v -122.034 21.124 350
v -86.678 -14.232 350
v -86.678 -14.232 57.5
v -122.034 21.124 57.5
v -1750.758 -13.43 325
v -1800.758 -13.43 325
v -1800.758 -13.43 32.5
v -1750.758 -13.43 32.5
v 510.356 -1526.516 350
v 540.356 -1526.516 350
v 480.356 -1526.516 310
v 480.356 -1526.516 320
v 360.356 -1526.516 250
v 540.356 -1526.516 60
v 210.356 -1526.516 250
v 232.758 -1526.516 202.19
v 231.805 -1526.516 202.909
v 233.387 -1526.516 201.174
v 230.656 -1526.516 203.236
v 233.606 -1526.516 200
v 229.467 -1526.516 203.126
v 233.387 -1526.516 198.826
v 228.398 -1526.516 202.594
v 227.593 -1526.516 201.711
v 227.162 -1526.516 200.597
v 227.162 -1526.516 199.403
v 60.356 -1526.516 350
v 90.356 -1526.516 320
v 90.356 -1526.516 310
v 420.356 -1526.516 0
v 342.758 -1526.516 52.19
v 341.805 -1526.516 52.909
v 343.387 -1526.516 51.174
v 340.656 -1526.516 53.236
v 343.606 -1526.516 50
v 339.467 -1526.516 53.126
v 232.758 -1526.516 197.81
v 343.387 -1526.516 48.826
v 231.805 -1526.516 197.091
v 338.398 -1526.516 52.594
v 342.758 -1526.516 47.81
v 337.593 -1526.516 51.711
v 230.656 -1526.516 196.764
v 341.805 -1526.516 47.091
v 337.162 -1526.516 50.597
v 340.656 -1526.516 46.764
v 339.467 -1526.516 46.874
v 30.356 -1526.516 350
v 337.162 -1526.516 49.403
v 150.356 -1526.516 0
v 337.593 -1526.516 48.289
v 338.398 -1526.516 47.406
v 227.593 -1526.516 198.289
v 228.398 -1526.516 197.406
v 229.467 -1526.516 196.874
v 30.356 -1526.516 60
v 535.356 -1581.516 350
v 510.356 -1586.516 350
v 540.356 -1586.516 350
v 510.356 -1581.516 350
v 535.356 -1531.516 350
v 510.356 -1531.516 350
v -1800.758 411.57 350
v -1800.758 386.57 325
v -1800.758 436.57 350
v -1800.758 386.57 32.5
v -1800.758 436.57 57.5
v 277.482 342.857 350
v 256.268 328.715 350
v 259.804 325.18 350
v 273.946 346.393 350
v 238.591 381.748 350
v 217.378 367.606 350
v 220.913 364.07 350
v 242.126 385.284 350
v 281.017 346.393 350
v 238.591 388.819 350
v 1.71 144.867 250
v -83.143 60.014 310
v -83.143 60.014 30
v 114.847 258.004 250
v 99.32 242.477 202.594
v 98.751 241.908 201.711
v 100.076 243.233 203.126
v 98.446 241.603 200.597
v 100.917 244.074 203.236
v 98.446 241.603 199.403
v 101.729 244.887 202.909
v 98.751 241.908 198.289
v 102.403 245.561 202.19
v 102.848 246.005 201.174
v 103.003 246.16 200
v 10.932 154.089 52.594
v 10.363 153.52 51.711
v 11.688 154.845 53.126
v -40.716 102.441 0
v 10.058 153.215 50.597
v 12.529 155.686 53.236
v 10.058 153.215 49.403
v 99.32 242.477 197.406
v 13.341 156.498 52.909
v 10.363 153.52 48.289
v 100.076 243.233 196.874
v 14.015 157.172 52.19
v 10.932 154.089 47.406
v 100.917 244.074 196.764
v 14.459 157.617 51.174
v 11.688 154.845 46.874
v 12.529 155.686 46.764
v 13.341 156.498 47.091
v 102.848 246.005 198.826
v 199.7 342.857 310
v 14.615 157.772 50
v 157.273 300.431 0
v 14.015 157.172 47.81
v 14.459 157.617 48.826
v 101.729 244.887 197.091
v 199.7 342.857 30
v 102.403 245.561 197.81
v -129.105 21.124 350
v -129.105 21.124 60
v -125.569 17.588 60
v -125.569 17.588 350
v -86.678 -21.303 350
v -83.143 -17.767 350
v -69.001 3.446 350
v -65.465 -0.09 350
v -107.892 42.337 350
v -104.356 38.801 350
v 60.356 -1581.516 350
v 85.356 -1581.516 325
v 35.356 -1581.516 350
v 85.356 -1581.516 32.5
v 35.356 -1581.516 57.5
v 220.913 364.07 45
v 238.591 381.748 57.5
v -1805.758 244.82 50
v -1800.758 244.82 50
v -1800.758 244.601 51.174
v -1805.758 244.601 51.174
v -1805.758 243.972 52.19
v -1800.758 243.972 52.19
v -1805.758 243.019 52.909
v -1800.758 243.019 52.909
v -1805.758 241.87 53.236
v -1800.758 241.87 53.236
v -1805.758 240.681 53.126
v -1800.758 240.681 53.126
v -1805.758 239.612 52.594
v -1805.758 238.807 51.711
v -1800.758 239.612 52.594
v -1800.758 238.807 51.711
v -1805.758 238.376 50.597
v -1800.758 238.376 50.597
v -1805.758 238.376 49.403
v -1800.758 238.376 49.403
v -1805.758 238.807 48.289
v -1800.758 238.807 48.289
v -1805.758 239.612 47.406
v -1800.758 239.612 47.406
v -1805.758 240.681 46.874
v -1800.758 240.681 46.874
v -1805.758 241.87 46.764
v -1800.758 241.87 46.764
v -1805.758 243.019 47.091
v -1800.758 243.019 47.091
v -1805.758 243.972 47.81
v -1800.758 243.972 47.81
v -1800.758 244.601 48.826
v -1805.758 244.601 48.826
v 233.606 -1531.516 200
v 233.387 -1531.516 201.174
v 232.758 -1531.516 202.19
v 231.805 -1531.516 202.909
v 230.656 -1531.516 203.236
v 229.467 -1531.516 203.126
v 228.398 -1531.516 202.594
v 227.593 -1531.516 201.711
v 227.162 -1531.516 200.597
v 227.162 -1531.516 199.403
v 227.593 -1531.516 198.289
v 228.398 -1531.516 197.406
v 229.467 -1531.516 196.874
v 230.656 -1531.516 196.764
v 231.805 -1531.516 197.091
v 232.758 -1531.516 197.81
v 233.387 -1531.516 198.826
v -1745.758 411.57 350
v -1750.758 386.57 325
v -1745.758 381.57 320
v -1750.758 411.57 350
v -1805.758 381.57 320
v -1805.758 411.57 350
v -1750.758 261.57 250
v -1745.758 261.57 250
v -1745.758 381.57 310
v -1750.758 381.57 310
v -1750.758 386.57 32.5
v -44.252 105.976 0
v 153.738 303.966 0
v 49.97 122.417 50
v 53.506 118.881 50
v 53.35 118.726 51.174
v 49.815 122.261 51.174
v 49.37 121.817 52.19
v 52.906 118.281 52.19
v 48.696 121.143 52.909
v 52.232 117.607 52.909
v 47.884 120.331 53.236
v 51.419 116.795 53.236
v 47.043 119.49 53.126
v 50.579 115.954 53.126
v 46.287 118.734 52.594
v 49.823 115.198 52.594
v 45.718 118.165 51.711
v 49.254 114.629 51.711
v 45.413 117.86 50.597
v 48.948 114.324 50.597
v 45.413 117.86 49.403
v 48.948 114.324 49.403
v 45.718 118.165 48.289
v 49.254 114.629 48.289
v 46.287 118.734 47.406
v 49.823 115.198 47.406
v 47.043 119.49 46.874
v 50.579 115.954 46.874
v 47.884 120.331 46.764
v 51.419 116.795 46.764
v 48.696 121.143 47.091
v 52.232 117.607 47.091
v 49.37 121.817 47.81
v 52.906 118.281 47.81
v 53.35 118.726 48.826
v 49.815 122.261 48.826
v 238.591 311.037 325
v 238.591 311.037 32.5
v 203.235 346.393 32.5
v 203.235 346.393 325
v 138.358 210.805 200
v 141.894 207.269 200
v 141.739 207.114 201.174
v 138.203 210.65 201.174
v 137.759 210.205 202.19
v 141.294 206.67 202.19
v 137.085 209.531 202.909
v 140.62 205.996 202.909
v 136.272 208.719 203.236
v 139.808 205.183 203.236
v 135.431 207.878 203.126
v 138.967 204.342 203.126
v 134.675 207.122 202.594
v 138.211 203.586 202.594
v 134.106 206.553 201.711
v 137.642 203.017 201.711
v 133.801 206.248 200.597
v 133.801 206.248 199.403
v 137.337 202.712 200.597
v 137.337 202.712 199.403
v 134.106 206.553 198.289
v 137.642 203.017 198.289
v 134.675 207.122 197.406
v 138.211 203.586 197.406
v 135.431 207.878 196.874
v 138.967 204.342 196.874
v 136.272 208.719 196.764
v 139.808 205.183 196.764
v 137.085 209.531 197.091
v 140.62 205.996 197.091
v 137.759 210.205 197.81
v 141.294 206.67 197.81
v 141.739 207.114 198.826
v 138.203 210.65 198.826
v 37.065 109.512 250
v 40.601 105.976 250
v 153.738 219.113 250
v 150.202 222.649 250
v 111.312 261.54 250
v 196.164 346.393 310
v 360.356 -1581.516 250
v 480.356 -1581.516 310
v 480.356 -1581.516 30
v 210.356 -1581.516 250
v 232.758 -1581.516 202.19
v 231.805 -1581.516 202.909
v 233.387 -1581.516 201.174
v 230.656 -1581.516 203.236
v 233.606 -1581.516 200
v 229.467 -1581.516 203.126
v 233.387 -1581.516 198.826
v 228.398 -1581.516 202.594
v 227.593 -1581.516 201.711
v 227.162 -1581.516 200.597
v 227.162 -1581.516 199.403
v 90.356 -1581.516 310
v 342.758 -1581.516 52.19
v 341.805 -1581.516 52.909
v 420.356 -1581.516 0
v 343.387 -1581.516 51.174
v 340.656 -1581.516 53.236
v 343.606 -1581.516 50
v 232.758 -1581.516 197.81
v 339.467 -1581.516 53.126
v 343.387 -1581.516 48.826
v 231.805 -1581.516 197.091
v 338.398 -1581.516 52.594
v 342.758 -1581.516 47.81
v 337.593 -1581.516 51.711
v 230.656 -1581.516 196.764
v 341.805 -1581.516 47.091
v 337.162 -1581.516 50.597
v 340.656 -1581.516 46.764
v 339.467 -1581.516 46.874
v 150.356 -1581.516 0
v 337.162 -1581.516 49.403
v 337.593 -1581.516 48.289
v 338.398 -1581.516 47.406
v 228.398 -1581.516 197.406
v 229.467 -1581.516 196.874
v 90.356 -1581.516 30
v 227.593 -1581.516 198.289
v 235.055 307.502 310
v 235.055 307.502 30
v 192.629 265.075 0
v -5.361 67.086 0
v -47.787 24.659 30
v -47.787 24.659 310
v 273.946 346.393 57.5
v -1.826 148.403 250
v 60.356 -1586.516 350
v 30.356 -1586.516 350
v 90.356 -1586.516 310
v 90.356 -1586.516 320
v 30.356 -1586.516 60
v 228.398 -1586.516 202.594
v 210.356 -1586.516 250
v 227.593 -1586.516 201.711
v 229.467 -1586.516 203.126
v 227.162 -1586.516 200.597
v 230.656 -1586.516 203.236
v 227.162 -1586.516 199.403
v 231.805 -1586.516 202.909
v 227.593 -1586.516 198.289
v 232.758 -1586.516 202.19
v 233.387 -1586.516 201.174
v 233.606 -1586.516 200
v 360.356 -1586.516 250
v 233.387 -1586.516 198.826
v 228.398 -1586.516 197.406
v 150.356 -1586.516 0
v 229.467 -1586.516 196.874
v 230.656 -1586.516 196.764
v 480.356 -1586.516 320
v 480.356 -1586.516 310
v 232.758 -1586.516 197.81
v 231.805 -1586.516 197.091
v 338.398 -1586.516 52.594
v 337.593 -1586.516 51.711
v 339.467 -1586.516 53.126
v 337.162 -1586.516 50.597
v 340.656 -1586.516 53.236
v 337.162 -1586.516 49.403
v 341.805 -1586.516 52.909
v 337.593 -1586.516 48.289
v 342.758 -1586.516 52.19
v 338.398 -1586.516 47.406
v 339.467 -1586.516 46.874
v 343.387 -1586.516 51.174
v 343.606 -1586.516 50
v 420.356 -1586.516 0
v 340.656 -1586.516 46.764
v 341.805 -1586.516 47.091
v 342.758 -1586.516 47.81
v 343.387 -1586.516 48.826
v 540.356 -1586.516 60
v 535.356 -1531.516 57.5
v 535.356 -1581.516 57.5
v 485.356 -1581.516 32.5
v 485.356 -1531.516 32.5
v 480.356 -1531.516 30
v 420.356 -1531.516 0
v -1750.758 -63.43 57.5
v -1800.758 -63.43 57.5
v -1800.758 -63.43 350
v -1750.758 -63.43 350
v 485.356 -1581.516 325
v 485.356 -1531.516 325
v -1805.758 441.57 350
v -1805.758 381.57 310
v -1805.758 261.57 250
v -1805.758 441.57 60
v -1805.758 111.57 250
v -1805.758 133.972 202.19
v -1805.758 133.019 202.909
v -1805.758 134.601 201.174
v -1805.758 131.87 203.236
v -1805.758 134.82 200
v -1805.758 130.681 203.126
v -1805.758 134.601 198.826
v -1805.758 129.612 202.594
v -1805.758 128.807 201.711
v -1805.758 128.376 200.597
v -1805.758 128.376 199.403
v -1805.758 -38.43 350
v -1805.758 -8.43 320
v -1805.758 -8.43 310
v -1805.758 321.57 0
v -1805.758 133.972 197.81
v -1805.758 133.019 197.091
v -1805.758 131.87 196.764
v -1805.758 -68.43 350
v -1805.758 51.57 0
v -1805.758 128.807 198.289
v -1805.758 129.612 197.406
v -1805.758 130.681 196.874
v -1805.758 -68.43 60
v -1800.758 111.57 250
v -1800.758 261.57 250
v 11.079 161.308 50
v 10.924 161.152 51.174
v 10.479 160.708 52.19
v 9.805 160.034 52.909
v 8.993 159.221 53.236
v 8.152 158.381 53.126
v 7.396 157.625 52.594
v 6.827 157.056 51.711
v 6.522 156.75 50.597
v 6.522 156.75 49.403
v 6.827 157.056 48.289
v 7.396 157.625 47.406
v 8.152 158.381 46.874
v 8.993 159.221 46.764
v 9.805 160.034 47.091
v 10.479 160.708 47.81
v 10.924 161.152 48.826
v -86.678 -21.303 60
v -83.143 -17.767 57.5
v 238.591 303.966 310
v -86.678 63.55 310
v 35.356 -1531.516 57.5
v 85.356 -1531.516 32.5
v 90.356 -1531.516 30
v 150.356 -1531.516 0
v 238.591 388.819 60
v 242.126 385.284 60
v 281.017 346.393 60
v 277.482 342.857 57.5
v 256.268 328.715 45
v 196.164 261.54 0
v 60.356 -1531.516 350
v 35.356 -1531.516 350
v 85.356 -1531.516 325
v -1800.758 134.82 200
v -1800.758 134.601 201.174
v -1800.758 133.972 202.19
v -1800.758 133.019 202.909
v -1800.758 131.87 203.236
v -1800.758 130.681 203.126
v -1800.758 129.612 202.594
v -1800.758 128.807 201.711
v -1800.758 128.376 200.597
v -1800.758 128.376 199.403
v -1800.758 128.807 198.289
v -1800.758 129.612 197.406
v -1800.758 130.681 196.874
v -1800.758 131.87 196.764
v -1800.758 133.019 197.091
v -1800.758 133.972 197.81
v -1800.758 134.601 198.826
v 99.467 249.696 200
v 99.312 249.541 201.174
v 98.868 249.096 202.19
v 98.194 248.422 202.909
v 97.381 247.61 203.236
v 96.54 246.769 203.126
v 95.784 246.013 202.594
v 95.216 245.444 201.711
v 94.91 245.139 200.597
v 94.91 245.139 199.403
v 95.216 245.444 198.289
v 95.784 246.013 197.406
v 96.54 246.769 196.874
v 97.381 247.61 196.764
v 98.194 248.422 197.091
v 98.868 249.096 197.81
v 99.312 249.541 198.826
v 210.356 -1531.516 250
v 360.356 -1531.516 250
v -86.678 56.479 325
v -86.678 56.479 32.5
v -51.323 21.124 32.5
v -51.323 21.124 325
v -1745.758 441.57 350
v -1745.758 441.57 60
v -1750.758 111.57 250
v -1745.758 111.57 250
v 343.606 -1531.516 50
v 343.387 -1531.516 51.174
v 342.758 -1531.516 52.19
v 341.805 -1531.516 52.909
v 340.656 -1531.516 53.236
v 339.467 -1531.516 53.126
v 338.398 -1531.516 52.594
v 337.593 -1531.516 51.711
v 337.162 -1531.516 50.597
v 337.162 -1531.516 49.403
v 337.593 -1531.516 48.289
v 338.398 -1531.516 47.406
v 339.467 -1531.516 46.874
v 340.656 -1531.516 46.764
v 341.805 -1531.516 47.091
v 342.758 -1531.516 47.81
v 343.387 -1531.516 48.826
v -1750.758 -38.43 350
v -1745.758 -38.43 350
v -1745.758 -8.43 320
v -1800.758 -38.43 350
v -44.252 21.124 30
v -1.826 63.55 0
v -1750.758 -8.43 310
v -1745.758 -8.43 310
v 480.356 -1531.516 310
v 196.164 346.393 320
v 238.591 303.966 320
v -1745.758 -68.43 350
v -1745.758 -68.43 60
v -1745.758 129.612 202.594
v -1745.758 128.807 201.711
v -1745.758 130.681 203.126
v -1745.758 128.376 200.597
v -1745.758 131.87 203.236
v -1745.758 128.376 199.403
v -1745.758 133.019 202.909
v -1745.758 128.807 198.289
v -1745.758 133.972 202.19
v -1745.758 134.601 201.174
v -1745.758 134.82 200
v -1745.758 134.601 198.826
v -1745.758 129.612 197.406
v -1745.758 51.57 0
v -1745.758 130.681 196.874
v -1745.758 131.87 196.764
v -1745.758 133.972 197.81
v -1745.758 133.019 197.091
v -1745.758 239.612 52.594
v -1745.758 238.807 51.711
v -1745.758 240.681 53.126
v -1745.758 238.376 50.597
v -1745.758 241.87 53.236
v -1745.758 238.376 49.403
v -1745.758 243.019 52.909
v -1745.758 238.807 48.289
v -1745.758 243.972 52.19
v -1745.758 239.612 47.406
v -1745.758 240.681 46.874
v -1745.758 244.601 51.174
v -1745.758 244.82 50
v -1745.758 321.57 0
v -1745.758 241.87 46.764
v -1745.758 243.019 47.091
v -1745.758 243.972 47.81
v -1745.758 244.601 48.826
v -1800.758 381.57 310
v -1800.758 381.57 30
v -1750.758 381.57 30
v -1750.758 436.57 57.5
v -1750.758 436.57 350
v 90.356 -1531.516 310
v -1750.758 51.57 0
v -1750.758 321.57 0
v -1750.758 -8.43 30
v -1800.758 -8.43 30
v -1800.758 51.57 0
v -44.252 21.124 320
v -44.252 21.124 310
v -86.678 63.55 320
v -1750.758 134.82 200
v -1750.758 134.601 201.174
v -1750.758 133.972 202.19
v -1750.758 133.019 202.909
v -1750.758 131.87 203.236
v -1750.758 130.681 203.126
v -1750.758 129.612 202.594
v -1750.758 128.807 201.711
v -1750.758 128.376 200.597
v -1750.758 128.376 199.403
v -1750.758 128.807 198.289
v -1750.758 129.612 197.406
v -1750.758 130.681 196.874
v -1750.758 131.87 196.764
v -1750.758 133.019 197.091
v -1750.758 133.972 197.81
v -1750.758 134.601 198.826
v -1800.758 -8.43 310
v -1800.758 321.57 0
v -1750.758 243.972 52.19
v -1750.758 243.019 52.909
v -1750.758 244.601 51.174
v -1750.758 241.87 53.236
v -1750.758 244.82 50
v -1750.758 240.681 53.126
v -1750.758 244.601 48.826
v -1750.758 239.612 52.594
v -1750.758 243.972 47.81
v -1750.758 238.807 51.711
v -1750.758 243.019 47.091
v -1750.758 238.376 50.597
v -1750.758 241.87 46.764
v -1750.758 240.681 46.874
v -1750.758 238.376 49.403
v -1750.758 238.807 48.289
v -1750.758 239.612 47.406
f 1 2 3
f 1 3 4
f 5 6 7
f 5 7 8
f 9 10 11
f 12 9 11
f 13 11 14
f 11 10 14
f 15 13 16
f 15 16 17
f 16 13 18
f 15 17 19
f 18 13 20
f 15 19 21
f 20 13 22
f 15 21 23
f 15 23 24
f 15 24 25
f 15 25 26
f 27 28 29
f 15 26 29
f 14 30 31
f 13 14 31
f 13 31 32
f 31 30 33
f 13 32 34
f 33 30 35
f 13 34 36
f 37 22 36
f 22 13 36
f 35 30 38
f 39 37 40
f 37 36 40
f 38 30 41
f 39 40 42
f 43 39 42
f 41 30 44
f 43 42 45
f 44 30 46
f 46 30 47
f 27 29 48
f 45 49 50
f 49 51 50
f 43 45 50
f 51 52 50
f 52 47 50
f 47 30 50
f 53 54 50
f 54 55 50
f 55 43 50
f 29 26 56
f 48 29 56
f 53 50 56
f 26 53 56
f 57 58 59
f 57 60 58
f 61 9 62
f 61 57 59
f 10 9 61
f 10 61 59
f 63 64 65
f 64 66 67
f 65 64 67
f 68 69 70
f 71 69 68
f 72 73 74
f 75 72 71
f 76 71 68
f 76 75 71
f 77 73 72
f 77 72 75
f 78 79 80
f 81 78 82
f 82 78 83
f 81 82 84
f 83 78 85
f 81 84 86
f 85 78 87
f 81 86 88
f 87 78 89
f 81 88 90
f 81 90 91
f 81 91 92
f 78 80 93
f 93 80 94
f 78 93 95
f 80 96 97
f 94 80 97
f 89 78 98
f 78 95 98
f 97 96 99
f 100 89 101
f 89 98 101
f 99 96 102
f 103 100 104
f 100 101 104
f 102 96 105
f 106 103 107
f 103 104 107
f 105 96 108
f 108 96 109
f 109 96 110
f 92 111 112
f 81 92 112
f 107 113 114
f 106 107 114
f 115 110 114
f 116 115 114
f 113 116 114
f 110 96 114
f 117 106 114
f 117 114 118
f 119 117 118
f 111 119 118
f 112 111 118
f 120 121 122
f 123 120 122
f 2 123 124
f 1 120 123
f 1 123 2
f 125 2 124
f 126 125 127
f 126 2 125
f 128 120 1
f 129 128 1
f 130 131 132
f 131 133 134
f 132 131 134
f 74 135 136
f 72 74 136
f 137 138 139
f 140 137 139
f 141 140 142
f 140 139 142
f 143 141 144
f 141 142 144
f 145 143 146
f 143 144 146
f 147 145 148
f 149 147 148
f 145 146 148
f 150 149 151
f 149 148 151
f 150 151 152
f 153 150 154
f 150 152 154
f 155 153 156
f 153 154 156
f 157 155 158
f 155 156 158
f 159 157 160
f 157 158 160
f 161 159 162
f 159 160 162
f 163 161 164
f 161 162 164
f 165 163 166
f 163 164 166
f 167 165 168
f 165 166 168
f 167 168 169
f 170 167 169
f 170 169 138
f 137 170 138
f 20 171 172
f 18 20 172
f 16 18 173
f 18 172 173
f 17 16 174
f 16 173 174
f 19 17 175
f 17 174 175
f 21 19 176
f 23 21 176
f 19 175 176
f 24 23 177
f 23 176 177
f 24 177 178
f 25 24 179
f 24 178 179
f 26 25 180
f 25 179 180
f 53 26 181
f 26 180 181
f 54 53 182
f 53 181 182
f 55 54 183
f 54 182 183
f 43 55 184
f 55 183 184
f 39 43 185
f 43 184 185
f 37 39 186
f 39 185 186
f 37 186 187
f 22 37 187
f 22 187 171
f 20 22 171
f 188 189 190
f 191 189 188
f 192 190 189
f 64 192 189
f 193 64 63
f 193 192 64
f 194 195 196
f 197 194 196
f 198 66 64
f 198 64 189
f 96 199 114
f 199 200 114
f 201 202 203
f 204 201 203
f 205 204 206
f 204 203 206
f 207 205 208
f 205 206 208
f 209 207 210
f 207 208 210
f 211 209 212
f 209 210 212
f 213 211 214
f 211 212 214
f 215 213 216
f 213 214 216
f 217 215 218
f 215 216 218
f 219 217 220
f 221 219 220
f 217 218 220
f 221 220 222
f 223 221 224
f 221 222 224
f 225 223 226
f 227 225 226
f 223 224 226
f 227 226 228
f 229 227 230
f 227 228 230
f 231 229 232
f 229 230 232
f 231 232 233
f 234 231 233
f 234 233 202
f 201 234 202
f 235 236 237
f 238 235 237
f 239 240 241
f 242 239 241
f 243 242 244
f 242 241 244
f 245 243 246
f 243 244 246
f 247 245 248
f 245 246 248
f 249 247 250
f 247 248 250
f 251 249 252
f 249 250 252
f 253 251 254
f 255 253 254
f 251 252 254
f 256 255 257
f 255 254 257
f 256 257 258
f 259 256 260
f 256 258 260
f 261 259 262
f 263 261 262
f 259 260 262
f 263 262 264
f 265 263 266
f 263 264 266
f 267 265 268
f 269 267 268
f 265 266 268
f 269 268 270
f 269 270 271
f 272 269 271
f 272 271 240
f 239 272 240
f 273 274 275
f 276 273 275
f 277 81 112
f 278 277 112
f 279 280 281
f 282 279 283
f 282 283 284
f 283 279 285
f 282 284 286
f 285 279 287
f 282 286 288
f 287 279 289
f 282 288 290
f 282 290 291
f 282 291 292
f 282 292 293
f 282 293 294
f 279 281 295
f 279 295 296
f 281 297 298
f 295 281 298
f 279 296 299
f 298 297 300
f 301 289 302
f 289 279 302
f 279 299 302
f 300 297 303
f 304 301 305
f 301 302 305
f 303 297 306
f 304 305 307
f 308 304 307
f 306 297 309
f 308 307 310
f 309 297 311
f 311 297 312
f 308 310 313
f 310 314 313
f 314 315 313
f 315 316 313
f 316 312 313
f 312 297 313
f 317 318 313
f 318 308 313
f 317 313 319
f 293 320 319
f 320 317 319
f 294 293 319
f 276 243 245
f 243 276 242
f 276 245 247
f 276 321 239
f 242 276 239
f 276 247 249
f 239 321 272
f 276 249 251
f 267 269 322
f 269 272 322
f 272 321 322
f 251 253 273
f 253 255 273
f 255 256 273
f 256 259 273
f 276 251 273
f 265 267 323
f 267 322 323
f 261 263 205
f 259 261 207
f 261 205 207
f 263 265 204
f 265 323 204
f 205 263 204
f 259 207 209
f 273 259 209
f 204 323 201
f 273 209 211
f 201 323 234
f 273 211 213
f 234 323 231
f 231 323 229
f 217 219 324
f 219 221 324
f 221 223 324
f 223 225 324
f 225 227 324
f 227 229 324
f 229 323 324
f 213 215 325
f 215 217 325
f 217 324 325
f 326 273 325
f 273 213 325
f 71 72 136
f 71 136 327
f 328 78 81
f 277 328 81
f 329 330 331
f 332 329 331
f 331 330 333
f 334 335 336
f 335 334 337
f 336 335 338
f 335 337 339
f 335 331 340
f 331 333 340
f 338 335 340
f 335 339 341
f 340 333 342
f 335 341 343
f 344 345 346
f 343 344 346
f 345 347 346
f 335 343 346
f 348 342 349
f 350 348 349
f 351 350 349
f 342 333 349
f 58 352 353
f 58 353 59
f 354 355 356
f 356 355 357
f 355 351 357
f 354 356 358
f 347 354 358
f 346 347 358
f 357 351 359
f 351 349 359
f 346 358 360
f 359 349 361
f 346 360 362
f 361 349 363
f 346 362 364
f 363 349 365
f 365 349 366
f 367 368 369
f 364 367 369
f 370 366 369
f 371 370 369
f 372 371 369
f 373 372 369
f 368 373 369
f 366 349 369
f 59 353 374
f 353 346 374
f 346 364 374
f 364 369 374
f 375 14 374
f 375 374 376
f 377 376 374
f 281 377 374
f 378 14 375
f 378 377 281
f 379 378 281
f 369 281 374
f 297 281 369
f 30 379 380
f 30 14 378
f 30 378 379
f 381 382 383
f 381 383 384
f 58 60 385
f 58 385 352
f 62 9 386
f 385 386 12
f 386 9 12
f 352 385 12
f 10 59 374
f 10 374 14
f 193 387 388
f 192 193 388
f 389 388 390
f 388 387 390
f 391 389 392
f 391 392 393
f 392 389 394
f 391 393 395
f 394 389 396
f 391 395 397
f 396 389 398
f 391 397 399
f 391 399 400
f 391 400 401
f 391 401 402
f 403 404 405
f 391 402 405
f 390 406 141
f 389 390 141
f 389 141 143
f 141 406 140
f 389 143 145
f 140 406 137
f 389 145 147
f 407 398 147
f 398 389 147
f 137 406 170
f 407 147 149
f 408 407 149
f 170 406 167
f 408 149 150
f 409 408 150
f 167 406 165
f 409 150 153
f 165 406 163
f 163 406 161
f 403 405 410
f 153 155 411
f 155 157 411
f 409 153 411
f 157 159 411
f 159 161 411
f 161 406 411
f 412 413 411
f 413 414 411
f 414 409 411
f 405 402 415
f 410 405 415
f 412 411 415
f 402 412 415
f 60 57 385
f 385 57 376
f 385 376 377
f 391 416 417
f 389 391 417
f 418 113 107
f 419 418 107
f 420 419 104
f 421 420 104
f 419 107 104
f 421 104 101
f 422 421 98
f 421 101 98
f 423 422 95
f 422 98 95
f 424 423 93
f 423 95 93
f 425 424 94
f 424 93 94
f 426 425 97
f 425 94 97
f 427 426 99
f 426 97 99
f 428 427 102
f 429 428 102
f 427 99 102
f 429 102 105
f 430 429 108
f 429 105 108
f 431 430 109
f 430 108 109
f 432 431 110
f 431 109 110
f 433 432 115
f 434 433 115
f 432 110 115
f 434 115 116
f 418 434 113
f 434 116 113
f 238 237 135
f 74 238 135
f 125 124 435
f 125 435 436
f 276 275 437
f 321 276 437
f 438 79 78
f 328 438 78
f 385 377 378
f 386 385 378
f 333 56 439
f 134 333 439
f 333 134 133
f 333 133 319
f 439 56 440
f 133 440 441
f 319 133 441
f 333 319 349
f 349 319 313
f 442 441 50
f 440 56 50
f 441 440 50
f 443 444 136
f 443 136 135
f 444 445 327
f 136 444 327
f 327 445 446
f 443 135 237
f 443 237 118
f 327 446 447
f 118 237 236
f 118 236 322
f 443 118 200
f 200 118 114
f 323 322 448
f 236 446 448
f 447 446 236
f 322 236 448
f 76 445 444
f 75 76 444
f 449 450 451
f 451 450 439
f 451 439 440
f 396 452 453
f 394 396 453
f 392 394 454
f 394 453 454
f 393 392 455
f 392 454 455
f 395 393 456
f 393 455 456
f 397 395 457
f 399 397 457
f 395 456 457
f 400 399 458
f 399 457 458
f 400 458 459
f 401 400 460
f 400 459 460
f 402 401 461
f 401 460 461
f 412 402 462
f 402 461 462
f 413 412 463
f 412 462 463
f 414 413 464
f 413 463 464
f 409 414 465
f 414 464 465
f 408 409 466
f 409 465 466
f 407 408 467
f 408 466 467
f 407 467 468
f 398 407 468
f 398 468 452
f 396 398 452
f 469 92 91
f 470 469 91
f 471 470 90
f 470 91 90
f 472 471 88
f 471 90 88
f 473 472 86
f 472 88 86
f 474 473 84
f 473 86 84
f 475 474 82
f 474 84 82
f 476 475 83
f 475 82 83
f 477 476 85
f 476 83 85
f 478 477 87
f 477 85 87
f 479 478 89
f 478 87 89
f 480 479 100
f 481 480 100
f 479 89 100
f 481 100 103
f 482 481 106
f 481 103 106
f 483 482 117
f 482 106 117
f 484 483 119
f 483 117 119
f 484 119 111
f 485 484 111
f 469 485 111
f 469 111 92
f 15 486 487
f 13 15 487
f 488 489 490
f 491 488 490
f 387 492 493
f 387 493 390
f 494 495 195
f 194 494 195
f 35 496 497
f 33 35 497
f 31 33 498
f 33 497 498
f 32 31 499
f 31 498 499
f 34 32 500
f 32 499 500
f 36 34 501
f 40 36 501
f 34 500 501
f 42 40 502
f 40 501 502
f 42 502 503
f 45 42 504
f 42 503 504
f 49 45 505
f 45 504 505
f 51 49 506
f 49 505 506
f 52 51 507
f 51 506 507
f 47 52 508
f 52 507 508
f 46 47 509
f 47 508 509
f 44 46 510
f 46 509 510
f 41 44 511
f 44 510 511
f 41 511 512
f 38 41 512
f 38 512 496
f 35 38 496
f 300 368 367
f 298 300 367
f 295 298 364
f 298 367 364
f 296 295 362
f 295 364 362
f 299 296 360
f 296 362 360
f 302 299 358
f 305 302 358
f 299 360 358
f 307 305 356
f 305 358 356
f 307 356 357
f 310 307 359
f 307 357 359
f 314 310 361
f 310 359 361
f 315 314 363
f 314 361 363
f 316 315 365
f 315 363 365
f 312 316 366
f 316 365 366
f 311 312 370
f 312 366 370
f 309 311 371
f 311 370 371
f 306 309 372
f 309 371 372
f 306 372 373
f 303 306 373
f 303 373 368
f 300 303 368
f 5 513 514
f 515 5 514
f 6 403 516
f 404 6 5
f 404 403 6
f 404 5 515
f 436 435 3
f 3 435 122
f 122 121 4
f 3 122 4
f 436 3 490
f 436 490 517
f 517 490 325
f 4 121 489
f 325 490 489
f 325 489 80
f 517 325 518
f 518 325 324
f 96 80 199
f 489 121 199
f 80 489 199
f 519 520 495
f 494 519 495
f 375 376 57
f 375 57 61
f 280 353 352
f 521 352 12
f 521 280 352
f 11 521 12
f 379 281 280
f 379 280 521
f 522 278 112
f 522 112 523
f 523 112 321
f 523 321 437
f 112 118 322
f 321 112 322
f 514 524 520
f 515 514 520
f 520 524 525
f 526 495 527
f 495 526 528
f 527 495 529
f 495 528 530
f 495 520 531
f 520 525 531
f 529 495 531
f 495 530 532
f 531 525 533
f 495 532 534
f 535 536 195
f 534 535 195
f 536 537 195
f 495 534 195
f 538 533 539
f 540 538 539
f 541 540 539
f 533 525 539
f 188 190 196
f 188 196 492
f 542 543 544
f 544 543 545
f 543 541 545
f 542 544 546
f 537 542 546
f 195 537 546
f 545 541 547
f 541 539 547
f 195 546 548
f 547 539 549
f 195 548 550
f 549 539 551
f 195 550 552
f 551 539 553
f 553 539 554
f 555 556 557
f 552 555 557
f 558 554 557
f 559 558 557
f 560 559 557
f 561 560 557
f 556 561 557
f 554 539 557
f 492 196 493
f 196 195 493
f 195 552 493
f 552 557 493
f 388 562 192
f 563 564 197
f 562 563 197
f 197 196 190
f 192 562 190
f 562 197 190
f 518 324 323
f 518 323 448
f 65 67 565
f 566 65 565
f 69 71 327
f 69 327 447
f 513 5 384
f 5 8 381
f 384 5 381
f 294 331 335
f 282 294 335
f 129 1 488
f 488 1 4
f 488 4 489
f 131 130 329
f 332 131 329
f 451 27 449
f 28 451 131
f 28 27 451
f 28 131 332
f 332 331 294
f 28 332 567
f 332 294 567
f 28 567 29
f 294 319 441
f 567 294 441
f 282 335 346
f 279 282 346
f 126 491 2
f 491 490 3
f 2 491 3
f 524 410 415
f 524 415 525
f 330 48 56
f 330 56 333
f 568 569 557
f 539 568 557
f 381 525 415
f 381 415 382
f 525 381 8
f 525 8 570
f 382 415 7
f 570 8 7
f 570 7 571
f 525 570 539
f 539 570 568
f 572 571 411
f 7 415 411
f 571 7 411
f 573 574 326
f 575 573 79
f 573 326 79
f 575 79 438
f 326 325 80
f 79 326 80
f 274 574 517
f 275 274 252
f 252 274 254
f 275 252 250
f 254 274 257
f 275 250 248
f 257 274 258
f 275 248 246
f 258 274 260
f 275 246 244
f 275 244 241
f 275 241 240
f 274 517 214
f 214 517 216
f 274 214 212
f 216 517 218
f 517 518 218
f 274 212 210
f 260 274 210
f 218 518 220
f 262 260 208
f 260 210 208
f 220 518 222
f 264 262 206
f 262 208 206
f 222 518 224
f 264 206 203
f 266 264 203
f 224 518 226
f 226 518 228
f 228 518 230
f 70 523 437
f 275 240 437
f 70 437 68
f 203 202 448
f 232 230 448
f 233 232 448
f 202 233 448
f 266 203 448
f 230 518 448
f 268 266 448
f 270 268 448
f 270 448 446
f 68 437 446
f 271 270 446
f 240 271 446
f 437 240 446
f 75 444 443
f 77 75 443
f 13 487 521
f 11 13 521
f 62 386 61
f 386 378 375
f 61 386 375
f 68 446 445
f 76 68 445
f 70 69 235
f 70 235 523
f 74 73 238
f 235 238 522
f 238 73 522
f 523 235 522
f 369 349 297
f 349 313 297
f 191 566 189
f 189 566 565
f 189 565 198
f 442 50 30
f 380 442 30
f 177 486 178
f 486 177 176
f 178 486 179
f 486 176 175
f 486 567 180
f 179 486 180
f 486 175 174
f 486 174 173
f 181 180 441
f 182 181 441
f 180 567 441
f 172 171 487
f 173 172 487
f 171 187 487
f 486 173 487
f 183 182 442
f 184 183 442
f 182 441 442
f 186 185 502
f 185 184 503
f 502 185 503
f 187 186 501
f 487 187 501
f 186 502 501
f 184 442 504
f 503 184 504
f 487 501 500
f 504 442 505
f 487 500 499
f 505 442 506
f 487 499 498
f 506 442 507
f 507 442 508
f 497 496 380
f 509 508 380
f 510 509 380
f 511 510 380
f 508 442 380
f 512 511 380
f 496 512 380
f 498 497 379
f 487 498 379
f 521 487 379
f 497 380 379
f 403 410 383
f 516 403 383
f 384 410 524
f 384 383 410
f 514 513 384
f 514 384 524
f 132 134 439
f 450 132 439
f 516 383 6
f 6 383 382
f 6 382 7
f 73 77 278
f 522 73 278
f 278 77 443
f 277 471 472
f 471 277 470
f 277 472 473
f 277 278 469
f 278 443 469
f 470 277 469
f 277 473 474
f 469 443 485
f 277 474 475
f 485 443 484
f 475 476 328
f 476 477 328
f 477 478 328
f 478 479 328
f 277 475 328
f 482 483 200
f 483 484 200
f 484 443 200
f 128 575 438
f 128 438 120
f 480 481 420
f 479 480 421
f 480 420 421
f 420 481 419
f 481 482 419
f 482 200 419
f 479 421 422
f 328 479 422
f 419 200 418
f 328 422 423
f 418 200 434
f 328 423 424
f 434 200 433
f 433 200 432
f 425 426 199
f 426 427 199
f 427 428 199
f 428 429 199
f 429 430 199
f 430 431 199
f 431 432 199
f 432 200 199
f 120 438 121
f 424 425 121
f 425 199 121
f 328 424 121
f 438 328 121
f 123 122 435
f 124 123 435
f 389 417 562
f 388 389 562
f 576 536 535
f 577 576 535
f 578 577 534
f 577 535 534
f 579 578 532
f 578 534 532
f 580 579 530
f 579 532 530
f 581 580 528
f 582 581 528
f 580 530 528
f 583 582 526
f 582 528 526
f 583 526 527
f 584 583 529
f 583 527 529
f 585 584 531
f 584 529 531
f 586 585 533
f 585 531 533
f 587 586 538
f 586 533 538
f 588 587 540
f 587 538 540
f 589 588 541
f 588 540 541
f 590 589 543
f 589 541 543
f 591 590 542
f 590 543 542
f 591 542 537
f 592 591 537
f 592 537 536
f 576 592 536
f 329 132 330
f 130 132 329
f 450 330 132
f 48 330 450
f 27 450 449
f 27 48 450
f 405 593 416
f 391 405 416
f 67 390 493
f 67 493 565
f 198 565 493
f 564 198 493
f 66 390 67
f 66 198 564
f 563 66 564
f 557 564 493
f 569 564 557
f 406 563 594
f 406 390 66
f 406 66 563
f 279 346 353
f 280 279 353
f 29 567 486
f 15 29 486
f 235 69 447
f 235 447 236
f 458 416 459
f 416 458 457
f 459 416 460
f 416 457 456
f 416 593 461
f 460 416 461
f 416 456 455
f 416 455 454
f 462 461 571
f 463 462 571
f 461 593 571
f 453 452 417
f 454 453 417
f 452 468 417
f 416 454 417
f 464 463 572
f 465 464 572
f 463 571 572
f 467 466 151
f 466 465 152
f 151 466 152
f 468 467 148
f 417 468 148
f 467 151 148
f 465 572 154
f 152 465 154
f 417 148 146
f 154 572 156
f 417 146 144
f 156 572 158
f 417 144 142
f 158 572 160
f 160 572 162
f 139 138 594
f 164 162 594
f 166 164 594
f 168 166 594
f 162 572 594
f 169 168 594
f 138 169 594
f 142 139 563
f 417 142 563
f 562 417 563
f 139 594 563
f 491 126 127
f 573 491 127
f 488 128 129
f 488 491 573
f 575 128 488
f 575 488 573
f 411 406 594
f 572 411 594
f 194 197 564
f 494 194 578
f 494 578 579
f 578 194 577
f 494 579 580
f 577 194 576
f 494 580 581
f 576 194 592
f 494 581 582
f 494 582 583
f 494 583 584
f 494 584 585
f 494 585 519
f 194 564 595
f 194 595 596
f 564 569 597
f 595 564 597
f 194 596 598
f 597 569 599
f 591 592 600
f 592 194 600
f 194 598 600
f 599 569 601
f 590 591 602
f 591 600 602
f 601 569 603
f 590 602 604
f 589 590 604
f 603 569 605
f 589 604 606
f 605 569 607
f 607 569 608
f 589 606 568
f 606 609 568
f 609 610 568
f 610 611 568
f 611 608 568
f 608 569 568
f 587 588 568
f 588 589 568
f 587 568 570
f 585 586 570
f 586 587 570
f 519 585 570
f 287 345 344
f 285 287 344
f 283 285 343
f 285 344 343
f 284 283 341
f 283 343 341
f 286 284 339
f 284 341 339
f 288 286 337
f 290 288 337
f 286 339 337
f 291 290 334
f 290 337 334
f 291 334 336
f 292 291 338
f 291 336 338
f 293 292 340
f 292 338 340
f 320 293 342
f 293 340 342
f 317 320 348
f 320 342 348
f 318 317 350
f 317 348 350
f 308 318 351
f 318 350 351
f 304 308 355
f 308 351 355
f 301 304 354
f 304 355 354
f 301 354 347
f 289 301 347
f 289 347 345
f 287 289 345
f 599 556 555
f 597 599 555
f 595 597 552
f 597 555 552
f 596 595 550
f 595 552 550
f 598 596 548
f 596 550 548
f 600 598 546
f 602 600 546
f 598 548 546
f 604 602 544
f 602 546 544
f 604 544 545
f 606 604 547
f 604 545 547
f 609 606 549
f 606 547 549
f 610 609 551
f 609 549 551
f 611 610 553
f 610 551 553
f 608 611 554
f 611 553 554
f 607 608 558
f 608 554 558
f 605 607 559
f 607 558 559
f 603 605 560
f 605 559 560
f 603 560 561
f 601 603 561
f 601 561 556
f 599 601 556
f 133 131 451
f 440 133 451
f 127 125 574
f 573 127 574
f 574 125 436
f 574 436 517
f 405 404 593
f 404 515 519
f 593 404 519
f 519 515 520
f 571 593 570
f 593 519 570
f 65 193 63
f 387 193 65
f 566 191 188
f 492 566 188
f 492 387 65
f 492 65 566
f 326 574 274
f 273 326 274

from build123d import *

# Parameters (mm, degrees)
F0_W          = 390
F0_H          = 5
F0_W_2        = 5
F0_H_2        = 50
F1_DEPTH      = 350
F0_H_3        = 390
F0_W_3        = 50
F2_R          = 3.25
F3_DEPTH      = 100
F4_R          = 3.25
F5_DEPTH      = 100
F6_R          = 3.25
F7_DEPTH      = 100
F8_T1_DEPTH   = 681.5589297088
F8_2_T1_DEPTH = 681.5589297088
F8_2_T3_DEPTH = 681.5589297088
F8_3_T1_DEPTH = 681.5589297088
F9_T1_DEPTH   = 214.3009792779
F9_2_T1_DEPTH = 214.300979278
F9_3_T1_DEPTH = 214.300979278


# Not quite as in the source:
# - a fillet or chamfer that OpenCascade refuses, or shapes differently, is made with other operations: its cross-section is extruded or revolved along the edge and cut away or added


with BuildPart() as f1:
    # F0 (on Top) → F1 (new body)
    with BuildSketch(Plane.XY):
        Polygon((90.3563703896, -1526.5155034513), (90.3563703896, -1531.5155034513), (480.3563703896, -1531.5155034513), (480.3563703896, -1526.5155034513), (460.3563703896, -1526.5155034513), (410.3563703896, -1526.5155034513), (160.3563703896, -1526.5155034513), (110.3563703896, -1526.5155034513), align=None)
        with Locations((285.3563703896, -1584.0155034513)):
            Rectangle(F0_W, F0_H)
        with Locations((87.8563703896, -1556.5155034513)):
            Rectangle(F0_W_2, F0_H_2)
        Polygon((30.3563703896, -1526.5155034513), (30.3563703896, -1531.5155034513), (35.3563703896, -1531.5155034513), (85.3563703896, -1531.5155034513), (90.3563703896, -1531.5155034513), (90.3563703896, -1526.5155034513), align=None)
        with Locations((32.8563703896, -1556.5155034513)):
            Rectangle(F0_W_2, F0_H_2)
        Polygon((30.3563703896, -1581.5155034513), (30.3563703896, -1586.5155034513), (90.3563703896, -1586.5155034513), (90.3563703896, -1581.5155034513), (85.3563703896, -1581.5155034513), (35.3563703896, -1581.5155034513), align=None)
        Polygon((480.3563703896, -1581.5155034513), (480.3563703896, -1586.5155034513), (540.3563703896, -1586.5155034513), (540.3563703896, -1581.5155034513), (535.3563703896, -1581.5155034513), (485.3563703896, -1581.5155034513), align=None)
        with Locations((482.8563703896, -1556.5155034513)):
            Rectangle(F0_W_2, F0_H_2)
        Polygon((480.3563703896, -1526.5155034513), (480.3563703896, -1531.5155034513), (485.3563703896, -1531.5155034513), (535.3563703896, -1531.5155034513), (540.3563703896, -1531.5155034513), (540.3563703896, -1526.5155034513), align=None)
        with Locations((537.8563703896, -1556.5155034513)):
            Rectangle(F0_W_2, F0_H_2)
    extrude(amount=F1_DEPTH)

    # F6 (on face) → F7 (cut)
    with BuildSketch(Plane.XZ.offset(1586.5155034513)):
        with Locations((230.3563703896, 200)):
            Circle(F6_R)
        with Locations((340.3563703896, 50)):
            Circle(F6_R)
        Polygon((480.3563703896, 350), (90.3563703896, 350), (90.3563703896, 310), (210.3563703896, 250), (360.3563703896, 250), (480.3563703896, 310), align=None)
    extrude(amount=-F7_DEPTH, mode=Mode.SUBTRACT)

    # F8: chamfer of 60 x 120 on 2 edges, made by hand

    # F8_s2 → F8_t1 (cut)
    with BuildSketch(Plane.XZ.offset(1215.7360385969)):
        Polygon((540.3563703896, 60), (420.3563703896, 0), (540.3563703896, 0), align=None)
        Polygon((30.3563703896, 60), (150.3563703896, 0), (30.3563703896, 0), align=None)
    extrude(amount=F8_T1_DEPTH, mode=Mode.SUBTRACT)

    # F9: chamfer of 30 on 2 edges, made by hand

    # F9_s2 → F9_t1 (cut)
    with BuildSketch(Plane.XZ.offset(1449.3650138123)):
        Polygon((510.3563703896, 350), (480.3563703896, 320), (480.3563703896, 350), align=None)
        Polygon((60.3563703896, 350), (90.3563703896, 320), (90.3563703896, 350), align=None)
    extrude(amount=F9_T1_DEPTH, mode=Mode.SUBTRACT)


with BuildPart() as f1b:
    # F0 (on Top) → F1, piece 2 (new body)
    with BuildSketch(Plane.XY):
        Polygon((215.6097792881, 288.056401427), (219.145313194, 284.520867521), (222.6808471, 288.056401427), (219.145313194, 291.5919353329), align=None)
        Polygon((197.9321097584, 270.3787318973), (201.4676436644, 266.8431979914), (219.145313194, 284.520867521), (215.6097792881, 288.056401427), align=None)
        Polygon((176.7189063228, 326.9472743922), (159.0412367932, 309.2696048626), (162.5767706991, 305.7340709566), (180.2544402288, 323.4117404863), align=None)
        Polygon((180.2544402288, 330.4828082982), (176.7189063228, 326.9472743922), (180.2544402288, 323.4117404863), (183.7899741347, 326.9472743922), align=None)
        Polygon((-44.251962798, 21.1235915291), (201.4676436644, 266.8431979914), (197.9321097584, 270.3787318973), (-47.7874967039, 24.659125435), align=None)
        Polygon((162.5767706991, 305.7340709566), (159.0412367932, 309.2696048626), (-86.6783696692, 63.5499984002), (-83.1428357632, 60.0144644943), align=None)
        Polygon((196.1643428055, 346.3927108749), (180.2544402288, 330.4828082982), (183.7899741347, 326.9472743922), (199.6998767114, 342.8571769689), align=None)
        Polygon((219.145313194, 291.5919353329), (222.6808471, 288.056401427), (238.5907496767, 303.9663040037), (235.0552157707, 307.5018379096), align=None)
        Polygon((-47.7874967039, 24.659125435), (-83.1428357632, 60.0144644943), (-86.6783696692, 56.4789305884), (-51.3230306098, 21.123591529), align=None)
        Polygon((-86.6783696692, 63.5499984002), (-125.5692426344, 24.659125435), (-122.0337087285, 21.123591529), (-86.6783696692, 56.4789305884), (-83.1428357632, 60.0144644943), align=None)
        Polygon((-122.0337087285, 21.123591529), (-125.5692426344, 17.5880576231), (-90.2139035751, -17.7672814362), (-86.6783696692, -14.2317475303), align=None)
        Polygon((-125.5692426344, 24.659125435), (-129.1047765404, 21.123591529), (-125.5692426344, 17.5880576231), (-122.0337087285, 21.123591529), align=None)
        Polygon((-90.2139035751, -17.7672814362), (-86.6783696692, -21.3028153421), (-83.1428357632, -17.7672814362), (-86.6783696692, -14.2317475303), align=None)
        Polygon((-86.6783696692, -14.2317475303), (-83.1428357632, -17.7672814362), (-44.251962798, 21.1235915291), (-47.7874967039, 24.659125435), (-51.3230306098, 21.123591529), align=None)
        Polygon((235.0552157707, 385.2835838401), (196.1643428055, 346.3927108749), (199.6998767114, 342.8571769689), (203.2354106173, 346.3927108749), (220.913080147, 364.0703804045), (238.5907496767, 381.7480499342), align=None)
        Polygon((203.2354106173, 346.3927108749), (199.6998767114, 342.8571769689), (235.0552157707, 307.5018379096), (238.5907496767, 311.0373718155), align=None)
        Polygon((235.0552157707, 307.5018379096), (238.5907496767, 303.9663040037), (277.4816226419, 342.8571769689), (273.946088736, 346.3927108749), (256.2684192063, 328.7150413452), (238.5907496767, 311.0373718155), align=None)
        Polygon((273.946088736, 346.3927108749), (277.4816226419, 342.8571769689), (281.0171565478, 346.3927108749), (277.4816226419, 349.9282447808), align=None)
        Polygon((242.1262835826, 385.2835838401), (238.5907496767, 381.7480499342), (273.946088736, 346.3927108749), (277.4816226419, 349.9282447808), align=None)
        Polygon((238.5907496767, 388.8191177461), (235.0552157707, 385.2835838401), (238.5907496767, 381.7480499342), (242.1262835826, 385.2835838401), align=None)
    extrude(amount=F1_DEPTH)

    # F2 (on face) → F3 (cut)
    with BuildSketch(Plane(origin=(-32.6877771635, 32.6877771635, 0), x_dir=(0.7071067812, 0.7071067812, 0), z_dir=(0.7071067812, -0.7071067812, 0))):
        with Locations((118.6457718379, 50)):
            Circle(F2_R)
        with Locations((243.6457718379, 200)):
            Circle(F2_R)
        Polygon((383.6457718379, 350), (-16.3542281621, 350), (-16.3542281621, 310), (103.6457718379, 250), (263.6457718379, 250), (383.6457718379, 310), align=None)
    extrude(amount=-F3_DEPTH, mode=Mode.SUBTRACT)

    # F8#2: chamfer of 60 x 120 on 2 edges, made by hand

    # F8_2_s2 → F8_2_t1 (cut)
    with BuildSketch(Plane(origin=(187.0664898886, -187.0664898886, 0), x_dir=(0, 0, 1), z_dir=(-0.7071067812, 0.7071067812, 0))):
        Polygon((60, 443.6457718379), (0, 323.6457718379), (0, 443.6457718379), align=None)
    extrude(amount=F8_2_T1_DEPTH, mode=Mode.SUBTRACT)

    # F8_2_s4 → F8_2_t3 (cut)
    with BuildSketch(Plane(origin=(-294.8684510868, 294.8684510868, 0), x_dir=(0, 0, 1), z_dir=(0.7071067812, -0.7071067812, 0))):
        Polygon((60, 76.3542281621), (0, -43.6457718379), (0, 76.3542281621), align=None)
    extrude(amount=F8_2_T3_DEPTH, mode=Mode.SUBTRACT)

    # F9#2: chamfer of 30 on 2 edges, made by hand

    # F9_2_s2 → F9_2_t1 (cut)
    with BuildSketch(Plane(origin=(-129.6678184303, 129.6678184303, 0), x_dir=(0, 0, 1), z_dir=(0.7071067812, -0.7071067812, 0))):
        Polygon((350, 46.3542281621), (320, 16.3542281621), (350, 16.3542281621), align=None)
        Polygon((350, -413.6457718379), (320, -383.6457718379), (350, -383.6457718379), align=None)
    extrude(amount=F9_2_T1_DEPTH, mode=Mode.SUBTRACT)


with BuildPart() as f1c:
    # F0 (on Top) → F1, piece 3 (new body)
    with BuildSketch(Plane.XY):
        Polygon((-1745.7581393137, -8.4296195955), (-1745.7581393137, 11.5703804045), (-1745.7581393137, 49.0703804045), (-1745.7581393137, 61.5703804045), (-1745.7581393137, 311.5703804045), (-1745.7581393137, 324.0703804045), (-1745.7581393137, 349.0703804045), (-1745.7581393137, 361.5703804045), (-1745.7581393137, 381.5703804045), (-1750.7581393137, 381.5703804045), (-1750.7581393137, -8.4296195955), align=None)
        with Locations((-1803.2581393137, 186.5703804045)):
            Rectangle(F0_W_2, F0_H_3)
        Polygon((-1805.7581393137, 381.5703804045), (-1800.7581393137, 381.5703804045), (-1800.7581393137, 386.5703804045), (-1800.7581393137, 436.5703804045), (-1800.7581393137, 441.5703804045), (-1805.7581393137, 441.5703804045), align=None)
        with Locations((-1775.7581393137, 439.0703804045)):
            Rectangle(F0_W_3, F0_H)
        Polygon((-1750.7581393137, 381.5703804045), (-1745.7581393137, 381.5703804045), (-1745.7581393137, 441.5703804045), (-1750.7581393137, 441.5703804045), (-1750.7581393137, 436.5703804045), (-1750.7581393137, 386.5703804045), align=None)
        with Locations((-1775.7581393137, 384.0703804045)):
            Rectangle(F0_W_3, F0_H)
        Polygon((-1800.7581393137, -13.4296195955), (-1800.7581393137, -8.4296195955), (-1805.7581393137, -8.4296195955), (-1805.7581393137, -63.4296195955), (-1800.7581393137, -63.4296195955), align=None)
        with Locations((-1775.7581393137, -10.9296195955)):
            Rectangle(F0_W_3, F0_H)
        Polygon((-1745.7581393137, -63.4296195955), (-1745.7581393137, -8.4296195955), (-1750.7581393137, -8.4296195955), (-1750.7581393137, -13.4296195955), (-1750.7581393137, -63.4296195955), align=None)
        with Locations((-1748.2581393137, -65.9296195955)):
            Rectangle(F0_W_2, F0_H)
        with Locations((-1775.7581393137, -65.9296195955)):
            Rectangle(F0_W_3, F0_H)
        with Locations((-1803.2581393137, -65.9296195955)):
            Rectangle(F0_W_2, F0_H)
    extrude(amount=F1_DEPTH)

    # F4 (on face) → F5 (cut)
    with BuildSketch(Plane.YZ.offset(-1745.7581393137)):
        with Locations((131.5703804045, 200)):
            Circle(F4_R)
        with Locations((241.5703804045, 50)):
            Circle(F4_R)
        Polygon((381.5703804045, 310), (381.5703804045, 350), (-8.4296195955, 350), (-8.4296195955, 310), (111.5703804045, 250), (261.5703804045, 250), align=None)
    extrude(amount=-F5_DEPTH, mode=Mode.SUBTRACT)

    # F8#3: chamfer of 60 x 120 on 2 edges, made by hand

    # F8_3_s2 → F8_3_t1 (cut)
    with BuildSketch(Plane.YZ.offset(-2116.5376041681)):
        Polygon((441.5703804045, 60), (321.5703804045, 0), (441.5703804045, 0), align=None)
        Polygon((-68.4296195955, 60), (51.5703804045, 0), (-68.4296195955, 0), align=None)
    extrude(amount=F8_3_T1_DEPTH, mode=Mode.SUBTRACT)

    # F9#3: chamfer of 30 on 2 edges, made by hand

    # F9_3_s2 → F9_3_t1 (cut)
    with BuildSketch(Plane.YZ.offset(-1882.9086289527)):
        Polygon((-38.4296195955, 350), (-8.4296195955, 320), (-8.4296195955, 350), align=None)
        Polygon((381.5703804045, 320), (411.5703804045, 350), (381.5703804045, 350), align=None)
    extrude(amount=F9_3_T1_DEPTH, mode=Mode.SUBTRACT)


solid = Compound([f1.part, f1b.part, f1c.part])
